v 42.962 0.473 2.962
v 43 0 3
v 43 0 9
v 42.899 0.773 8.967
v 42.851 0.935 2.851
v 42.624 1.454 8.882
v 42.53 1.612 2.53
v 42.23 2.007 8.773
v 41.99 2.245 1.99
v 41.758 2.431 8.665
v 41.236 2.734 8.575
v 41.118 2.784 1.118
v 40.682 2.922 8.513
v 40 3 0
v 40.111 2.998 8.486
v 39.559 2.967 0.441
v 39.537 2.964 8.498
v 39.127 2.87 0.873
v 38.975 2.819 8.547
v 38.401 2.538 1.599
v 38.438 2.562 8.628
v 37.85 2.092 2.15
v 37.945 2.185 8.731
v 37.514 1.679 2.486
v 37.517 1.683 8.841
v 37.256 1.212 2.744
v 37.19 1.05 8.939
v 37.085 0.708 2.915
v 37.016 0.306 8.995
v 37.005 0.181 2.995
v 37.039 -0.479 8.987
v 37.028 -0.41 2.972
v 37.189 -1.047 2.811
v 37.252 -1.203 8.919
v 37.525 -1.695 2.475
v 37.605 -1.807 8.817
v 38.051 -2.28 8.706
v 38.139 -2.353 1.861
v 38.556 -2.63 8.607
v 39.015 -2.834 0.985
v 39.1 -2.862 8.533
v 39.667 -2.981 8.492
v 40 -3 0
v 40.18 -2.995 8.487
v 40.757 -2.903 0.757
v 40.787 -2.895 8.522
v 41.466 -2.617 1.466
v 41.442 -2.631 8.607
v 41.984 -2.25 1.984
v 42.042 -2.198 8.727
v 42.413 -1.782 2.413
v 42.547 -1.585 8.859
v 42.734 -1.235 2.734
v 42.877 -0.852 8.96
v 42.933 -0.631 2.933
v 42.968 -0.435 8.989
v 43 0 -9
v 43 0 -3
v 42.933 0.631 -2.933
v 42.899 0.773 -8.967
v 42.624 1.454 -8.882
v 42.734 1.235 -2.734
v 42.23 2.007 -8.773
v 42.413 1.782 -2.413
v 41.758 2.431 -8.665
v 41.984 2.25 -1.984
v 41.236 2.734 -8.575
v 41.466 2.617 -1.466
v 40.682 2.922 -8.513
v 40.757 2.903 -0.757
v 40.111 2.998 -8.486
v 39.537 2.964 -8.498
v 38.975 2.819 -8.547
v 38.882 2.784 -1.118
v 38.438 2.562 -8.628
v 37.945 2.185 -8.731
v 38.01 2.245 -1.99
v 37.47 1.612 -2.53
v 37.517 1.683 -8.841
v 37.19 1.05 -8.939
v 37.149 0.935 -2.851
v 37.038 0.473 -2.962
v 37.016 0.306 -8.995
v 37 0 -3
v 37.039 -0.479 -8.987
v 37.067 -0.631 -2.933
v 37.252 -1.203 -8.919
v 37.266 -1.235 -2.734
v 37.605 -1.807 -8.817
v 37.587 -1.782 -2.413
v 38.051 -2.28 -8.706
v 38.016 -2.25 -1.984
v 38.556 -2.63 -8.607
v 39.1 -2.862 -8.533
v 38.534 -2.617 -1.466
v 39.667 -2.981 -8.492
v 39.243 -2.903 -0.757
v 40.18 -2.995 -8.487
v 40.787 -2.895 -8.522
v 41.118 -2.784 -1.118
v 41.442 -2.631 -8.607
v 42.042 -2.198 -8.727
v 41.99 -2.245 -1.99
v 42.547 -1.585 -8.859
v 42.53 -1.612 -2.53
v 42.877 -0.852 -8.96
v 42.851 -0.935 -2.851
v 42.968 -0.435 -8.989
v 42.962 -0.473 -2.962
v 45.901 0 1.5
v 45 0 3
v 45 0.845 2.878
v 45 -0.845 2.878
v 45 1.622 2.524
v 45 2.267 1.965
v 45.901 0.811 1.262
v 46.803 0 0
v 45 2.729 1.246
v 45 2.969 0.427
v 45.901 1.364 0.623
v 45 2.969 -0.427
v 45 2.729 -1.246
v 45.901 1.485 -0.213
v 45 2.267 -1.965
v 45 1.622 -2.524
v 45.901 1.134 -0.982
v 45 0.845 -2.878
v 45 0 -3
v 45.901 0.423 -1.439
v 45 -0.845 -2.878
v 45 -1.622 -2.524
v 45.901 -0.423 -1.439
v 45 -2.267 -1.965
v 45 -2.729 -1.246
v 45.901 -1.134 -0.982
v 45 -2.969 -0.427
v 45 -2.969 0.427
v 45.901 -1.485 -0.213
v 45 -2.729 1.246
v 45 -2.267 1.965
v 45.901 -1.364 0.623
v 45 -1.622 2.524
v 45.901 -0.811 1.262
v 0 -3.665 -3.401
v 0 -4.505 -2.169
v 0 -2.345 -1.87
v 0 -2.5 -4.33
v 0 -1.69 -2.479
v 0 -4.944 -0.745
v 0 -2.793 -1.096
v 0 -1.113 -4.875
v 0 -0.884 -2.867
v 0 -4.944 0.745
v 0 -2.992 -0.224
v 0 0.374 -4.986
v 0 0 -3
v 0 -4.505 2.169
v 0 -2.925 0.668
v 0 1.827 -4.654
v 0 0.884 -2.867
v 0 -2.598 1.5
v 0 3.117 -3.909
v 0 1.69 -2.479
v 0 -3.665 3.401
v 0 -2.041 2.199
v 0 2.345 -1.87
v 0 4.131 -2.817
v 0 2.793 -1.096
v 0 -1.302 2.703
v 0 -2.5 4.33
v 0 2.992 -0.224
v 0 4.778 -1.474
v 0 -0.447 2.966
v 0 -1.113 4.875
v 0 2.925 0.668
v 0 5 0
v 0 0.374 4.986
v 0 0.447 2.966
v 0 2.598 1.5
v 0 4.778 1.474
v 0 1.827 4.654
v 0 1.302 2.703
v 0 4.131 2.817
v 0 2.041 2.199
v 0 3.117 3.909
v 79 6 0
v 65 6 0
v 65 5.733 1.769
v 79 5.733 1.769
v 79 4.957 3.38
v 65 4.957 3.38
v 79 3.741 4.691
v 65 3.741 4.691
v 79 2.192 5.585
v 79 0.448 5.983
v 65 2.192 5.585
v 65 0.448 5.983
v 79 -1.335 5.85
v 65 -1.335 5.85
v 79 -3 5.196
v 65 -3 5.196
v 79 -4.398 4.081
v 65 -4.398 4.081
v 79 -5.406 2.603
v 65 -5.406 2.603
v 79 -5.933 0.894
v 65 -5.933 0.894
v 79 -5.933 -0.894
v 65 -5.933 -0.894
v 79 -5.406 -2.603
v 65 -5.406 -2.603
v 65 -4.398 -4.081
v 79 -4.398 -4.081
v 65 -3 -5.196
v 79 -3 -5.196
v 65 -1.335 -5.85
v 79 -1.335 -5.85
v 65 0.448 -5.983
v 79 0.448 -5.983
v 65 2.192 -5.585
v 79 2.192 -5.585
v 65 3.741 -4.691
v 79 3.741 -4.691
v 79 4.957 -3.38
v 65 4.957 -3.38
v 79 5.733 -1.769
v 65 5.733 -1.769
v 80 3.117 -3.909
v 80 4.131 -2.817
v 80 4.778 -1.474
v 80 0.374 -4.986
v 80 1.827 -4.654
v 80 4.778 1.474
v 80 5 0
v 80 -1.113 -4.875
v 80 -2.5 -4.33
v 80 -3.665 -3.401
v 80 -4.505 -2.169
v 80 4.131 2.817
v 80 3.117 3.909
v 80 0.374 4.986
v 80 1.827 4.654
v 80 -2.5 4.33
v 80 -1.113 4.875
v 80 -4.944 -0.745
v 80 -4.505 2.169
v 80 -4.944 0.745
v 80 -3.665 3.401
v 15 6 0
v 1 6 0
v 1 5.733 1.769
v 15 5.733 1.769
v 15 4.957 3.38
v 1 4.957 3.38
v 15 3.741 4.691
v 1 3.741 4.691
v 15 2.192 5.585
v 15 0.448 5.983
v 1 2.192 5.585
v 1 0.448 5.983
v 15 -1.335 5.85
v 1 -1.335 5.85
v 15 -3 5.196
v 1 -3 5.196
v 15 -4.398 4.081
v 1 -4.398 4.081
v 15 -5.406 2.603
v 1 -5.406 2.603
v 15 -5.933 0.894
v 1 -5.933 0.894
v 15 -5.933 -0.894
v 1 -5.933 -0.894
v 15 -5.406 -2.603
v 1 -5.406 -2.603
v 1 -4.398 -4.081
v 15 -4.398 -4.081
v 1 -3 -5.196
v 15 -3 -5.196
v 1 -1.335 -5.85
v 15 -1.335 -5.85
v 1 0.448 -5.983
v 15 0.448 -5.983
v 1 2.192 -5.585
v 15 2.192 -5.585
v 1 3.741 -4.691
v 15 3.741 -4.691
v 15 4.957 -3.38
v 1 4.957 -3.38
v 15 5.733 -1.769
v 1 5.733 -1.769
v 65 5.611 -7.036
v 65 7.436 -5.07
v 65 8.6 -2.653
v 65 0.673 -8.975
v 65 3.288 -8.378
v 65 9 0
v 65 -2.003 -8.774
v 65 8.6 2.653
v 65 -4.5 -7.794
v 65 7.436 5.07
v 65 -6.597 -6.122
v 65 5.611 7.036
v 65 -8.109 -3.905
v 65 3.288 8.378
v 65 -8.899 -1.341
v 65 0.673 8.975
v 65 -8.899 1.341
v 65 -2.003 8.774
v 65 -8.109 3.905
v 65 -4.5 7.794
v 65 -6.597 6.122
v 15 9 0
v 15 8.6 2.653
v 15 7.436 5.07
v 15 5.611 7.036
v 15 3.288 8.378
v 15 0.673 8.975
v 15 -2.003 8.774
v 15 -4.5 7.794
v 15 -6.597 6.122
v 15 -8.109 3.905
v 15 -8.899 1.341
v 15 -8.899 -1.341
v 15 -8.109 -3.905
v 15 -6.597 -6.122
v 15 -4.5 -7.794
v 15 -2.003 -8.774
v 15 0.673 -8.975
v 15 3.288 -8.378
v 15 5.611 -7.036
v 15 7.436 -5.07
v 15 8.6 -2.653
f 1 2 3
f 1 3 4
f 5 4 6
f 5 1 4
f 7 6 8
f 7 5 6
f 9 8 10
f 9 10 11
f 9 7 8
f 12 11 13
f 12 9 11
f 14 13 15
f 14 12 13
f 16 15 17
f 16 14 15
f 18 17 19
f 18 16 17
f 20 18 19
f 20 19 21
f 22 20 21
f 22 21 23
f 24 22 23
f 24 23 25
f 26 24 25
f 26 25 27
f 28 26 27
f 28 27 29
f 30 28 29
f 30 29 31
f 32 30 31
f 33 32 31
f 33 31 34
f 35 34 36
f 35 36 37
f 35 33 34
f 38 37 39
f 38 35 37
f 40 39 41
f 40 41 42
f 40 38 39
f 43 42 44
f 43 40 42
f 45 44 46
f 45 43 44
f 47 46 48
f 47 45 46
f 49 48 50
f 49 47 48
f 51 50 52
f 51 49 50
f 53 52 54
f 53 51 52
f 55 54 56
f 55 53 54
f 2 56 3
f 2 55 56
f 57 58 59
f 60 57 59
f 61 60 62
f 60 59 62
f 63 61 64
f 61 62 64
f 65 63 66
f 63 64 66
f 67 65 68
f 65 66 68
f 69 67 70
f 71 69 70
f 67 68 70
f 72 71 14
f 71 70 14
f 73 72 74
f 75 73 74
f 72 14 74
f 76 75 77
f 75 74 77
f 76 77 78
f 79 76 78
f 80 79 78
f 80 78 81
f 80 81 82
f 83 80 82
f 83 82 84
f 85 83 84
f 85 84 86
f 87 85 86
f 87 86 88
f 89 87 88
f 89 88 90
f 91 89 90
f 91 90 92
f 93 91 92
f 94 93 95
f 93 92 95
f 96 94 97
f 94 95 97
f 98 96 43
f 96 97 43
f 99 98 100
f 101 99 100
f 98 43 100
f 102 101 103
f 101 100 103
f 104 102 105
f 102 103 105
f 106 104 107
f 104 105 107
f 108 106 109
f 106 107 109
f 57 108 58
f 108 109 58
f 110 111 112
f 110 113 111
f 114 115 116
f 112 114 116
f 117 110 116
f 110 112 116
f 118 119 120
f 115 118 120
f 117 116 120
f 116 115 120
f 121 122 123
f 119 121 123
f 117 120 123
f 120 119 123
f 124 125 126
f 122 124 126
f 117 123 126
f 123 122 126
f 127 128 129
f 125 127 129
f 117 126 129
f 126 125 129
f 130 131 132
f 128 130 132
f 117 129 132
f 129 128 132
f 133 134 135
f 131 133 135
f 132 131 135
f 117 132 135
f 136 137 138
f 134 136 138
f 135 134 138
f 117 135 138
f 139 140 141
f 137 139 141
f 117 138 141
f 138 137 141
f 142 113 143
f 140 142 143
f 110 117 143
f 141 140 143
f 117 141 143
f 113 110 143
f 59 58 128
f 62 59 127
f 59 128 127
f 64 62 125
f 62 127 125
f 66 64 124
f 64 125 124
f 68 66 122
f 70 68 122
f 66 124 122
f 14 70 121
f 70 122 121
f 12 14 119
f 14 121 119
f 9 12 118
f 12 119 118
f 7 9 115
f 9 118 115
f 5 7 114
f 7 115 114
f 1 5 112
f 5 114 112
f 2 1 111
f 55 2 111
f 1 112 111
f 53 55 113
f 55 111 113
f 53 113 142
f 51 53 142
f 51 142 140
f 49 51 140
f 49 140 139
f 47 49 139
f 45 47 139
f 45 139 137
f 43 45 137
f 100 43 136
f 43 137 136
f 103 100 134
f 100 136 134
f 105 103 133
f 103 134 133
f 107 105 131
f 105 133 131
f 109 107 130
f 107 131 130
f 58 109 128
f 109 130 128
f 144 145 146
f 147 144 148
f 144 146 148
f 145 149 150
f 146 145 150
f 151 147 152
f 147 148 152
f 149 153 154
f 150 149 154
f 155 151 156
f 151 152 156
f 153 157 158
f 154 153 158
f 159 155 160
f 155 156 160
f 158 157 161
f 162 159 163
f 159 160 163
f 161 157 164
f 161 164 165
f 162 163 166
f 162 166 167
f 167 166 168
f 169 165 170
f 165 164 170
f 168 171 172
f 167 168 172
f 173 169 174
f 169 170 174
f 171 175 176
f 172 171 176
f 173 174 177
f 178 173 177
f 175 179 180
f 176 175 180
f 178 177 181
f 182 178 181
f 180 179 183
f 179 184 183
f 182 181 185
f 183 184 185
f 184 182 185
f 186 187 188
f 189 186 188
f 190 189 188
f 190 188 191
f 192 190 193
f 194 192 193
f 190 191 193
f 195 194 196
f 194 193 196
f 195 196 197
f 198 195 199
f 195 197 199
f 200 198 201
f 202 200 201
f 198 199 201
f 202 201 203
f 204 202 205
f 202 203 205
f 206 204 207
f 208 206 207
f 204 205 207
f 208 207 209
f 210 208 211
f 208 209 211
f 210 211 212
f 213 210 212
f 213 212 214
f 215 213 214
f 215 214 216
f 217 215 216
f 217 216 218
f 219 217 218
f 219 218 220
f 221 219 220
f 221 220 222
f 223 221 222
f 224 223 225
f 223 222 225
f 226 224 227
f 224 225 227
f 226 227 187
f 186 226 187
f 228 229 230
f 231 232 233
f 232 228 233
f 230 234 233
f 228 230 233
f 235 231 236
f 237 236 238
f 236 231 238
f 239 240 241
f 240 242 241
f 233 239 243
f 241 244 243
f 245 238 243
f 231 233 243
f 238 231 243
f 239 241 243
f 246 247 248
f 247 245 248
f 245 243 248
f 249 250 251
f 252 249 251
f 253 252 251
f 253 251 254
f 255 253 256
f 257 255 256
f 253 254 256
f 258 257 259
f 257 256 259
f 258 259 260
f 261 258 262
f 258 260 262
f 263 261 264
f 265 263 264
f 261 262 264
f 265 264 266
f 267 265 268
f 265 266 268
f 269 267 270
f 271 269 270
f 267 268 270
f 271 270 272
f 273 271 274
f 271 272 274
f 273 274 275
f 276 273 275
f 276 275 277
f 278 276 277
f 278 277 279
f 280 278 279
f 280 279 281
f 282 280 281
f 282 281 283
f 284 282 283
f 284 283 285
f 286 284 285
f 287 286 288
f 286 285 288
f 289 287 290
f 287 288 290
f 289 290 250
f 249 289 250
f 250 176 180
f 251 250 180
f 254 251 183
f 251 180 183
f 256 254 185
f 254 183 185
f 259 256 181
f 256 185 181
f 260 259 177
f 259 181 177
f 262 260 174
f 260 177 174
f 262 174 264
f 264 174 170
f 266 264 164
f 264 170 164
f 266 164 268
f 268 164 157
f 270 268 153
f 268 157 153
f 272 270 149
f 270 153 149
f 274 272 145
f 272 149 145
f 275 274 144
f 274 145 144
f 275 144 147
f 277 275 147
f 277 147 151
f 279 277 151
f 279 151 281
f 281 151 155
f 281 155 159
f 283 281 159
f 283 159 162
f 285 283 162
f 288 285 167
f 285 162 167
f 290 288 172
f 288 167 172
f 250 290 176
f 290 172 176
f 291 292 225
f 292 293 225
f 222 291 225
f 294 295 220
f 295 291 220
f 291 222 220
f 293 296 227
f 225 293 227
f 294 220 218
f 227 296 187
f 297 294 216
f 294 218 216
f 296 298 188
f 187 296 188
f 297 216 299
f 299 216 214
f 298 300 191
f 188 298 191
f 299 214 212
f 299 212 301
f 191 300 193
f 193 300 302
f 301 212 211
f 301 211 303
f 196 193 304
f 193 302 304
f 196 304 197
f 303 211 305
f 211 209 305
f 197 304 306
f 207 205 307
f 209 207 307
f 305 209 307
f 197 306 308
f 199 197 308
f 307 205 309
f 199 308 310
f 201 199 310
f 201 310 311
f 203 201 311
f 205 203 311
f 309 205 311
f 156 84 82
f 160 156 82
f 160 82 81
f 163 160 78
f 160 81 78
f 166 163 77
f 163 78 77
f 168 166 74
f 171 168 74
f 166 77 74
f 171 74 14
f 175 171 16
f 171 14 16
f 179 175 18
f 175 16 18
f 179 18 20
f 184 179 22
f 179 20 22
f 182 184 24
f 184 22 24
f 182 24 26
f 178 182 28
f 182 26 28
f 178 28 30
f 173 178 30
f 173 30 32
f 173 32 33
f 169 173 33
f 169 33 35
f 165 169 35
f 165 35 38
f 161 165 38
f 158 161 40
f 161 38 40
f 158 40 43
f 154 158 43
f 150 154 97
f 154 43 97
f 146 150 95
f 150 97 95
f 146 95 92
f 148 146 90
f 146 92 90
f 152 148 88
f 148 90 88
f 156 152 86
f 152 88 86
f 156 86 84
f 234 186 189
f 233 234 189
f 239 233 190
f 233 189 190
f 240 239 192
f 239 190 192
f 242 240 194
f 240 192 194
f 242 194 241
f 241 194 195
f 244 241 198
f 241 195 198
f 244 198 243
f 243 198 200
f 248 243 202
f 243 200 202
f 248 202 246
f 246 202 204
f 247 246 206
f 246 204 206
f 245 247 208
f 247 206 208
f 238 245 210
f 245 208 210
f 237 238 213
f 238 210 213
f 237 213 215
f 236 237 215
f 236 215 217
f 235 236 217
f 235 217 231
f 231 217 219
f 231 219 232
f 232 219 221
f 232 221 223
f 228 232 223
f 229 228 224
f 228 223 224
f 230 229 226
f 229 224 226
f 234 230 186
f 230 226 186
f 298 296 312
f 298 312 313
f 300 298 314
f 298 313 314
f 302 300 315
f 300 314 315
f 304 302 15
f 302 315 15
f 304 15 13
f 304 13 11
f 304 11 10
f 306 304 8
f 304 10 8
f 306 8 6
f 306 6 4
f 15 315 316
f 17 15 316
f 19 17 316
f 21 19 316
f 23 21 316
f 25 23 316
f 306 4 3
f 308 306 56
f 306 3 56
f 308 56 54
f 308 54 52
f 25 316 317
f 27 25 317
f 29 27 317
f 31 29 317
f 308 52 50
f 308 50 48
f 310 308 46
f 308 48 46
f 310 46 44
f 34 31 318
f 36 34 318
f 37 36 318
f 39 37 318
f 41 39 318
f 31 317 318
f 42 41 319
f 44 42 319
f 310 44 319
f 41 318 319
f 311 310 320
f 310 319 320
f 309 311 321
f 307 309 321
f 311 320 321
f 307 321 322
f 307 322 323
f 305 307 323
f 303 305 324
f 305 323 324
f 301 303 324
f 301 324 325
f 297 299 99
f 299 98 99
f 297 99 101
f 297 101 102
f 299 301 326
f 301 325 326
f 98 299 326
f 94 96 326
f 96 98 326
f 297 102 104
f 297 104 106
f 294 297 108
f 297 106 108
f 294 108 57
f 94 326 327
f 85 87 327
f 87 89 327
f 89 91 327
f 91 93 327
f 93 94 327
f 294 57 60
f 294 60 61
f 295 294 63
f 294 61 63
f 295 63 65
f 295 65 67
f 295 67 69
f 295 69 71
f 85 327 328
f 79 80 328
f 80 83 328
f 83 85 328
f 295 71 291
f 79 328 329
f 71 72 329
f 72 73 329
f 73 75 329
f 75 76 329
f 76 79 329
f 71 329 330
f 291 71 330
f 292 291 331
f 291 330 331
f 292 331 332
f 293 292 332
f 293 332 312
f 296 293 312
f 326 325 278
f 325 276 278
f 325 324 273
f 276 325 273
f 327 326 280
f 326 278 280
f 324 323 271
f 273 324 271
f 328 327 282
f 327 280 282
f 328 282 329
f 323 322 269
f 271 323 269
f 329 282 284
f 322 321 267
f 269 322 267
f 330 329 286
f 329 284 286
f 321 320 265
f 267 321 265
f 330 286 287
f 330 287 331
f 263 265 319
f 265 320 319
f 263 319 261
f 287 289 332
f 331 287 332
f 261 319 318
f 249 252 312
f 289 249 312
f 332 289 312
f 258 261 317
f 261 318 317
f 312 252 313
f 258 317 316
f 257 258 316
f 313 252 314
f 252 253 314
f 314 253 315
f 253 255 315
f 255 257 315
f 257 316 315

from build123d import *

# Parameters (mm, degrees)
SKETCH2_R                    = 3
CUT_EXTRUDE1_DEPTH           = 10
CUT_EXTRUDE1_DEPTH_BACK      = 10
CHAMFER1_SIZE                = 1
F_6_0_6_DIAMETER_HOLE1_D     = 6
F_6_0_6_DIAMETER_HOLE1_DEPTH = 45
F_6_0_6_DIAMETER_HOLE1_TIP   = 1.802581857


with BuildPart() as part:
    # Sketch1 → Revolve1 (revolve)
    with BuildSketch(Plane.XY):
        Polygon((0, 0), (80, 0), (80, 6), (65, 6), (65, 9), (15, 9), (15, 6), (0, 6), align=None)
    revolve(axis=Axis((0, 0, 0), (1, 0, 0)))

    # Sketch2 → Cut-Extrude1 (cut, two sides)
    with BuildSketch(Plane.XY) as cut_extrude1_sk:
        with Locations((40, 0)):
            Circle(SKETCH2_R)
    extrude(amount=CUT_EXTRUDE1_DEPTH, mode=Mode.SUBTRACT)
    extrude(cut_extrude1_sk.sketch, amount=-CUT_EXTRUDE1_DEPTH_BACK, mode=Mode.SUBTRACT)

    # Chamfer1
    chamfer1_edges = [part.edges().sort_by_distance(p)[0] for p in [
        (0, -6, 0),
        (80, -6, 0),
    ]]
    chamfer(chamfer1_edges, length=CHAMFER1_SIZE)

    # Ø6.0 (6) Diameter Hole1
    with Locations(Plane.ZY):
        with Locations((0, 0)):
            Hole(F_6_0_6_DIAMETER_HOLE1_D / 2, depth=F_6_0_6_DIAMETER_HOLE1_DEPTH)
            with Locations((0, 0, -(F_6_0_6_DIAMETER_HOLE1_DEPTH + F_6_0_6_DIAMETER_HOLE1_TIP / 2))):  # 118° drill point
                Cone(0, F_6_0_6_DIAMETER_HOLE1_D / 2, F_6_0_6_DIAMETER_HOLE1_TIP, mode=Mode.SUBTRACT)


solid = part.part
